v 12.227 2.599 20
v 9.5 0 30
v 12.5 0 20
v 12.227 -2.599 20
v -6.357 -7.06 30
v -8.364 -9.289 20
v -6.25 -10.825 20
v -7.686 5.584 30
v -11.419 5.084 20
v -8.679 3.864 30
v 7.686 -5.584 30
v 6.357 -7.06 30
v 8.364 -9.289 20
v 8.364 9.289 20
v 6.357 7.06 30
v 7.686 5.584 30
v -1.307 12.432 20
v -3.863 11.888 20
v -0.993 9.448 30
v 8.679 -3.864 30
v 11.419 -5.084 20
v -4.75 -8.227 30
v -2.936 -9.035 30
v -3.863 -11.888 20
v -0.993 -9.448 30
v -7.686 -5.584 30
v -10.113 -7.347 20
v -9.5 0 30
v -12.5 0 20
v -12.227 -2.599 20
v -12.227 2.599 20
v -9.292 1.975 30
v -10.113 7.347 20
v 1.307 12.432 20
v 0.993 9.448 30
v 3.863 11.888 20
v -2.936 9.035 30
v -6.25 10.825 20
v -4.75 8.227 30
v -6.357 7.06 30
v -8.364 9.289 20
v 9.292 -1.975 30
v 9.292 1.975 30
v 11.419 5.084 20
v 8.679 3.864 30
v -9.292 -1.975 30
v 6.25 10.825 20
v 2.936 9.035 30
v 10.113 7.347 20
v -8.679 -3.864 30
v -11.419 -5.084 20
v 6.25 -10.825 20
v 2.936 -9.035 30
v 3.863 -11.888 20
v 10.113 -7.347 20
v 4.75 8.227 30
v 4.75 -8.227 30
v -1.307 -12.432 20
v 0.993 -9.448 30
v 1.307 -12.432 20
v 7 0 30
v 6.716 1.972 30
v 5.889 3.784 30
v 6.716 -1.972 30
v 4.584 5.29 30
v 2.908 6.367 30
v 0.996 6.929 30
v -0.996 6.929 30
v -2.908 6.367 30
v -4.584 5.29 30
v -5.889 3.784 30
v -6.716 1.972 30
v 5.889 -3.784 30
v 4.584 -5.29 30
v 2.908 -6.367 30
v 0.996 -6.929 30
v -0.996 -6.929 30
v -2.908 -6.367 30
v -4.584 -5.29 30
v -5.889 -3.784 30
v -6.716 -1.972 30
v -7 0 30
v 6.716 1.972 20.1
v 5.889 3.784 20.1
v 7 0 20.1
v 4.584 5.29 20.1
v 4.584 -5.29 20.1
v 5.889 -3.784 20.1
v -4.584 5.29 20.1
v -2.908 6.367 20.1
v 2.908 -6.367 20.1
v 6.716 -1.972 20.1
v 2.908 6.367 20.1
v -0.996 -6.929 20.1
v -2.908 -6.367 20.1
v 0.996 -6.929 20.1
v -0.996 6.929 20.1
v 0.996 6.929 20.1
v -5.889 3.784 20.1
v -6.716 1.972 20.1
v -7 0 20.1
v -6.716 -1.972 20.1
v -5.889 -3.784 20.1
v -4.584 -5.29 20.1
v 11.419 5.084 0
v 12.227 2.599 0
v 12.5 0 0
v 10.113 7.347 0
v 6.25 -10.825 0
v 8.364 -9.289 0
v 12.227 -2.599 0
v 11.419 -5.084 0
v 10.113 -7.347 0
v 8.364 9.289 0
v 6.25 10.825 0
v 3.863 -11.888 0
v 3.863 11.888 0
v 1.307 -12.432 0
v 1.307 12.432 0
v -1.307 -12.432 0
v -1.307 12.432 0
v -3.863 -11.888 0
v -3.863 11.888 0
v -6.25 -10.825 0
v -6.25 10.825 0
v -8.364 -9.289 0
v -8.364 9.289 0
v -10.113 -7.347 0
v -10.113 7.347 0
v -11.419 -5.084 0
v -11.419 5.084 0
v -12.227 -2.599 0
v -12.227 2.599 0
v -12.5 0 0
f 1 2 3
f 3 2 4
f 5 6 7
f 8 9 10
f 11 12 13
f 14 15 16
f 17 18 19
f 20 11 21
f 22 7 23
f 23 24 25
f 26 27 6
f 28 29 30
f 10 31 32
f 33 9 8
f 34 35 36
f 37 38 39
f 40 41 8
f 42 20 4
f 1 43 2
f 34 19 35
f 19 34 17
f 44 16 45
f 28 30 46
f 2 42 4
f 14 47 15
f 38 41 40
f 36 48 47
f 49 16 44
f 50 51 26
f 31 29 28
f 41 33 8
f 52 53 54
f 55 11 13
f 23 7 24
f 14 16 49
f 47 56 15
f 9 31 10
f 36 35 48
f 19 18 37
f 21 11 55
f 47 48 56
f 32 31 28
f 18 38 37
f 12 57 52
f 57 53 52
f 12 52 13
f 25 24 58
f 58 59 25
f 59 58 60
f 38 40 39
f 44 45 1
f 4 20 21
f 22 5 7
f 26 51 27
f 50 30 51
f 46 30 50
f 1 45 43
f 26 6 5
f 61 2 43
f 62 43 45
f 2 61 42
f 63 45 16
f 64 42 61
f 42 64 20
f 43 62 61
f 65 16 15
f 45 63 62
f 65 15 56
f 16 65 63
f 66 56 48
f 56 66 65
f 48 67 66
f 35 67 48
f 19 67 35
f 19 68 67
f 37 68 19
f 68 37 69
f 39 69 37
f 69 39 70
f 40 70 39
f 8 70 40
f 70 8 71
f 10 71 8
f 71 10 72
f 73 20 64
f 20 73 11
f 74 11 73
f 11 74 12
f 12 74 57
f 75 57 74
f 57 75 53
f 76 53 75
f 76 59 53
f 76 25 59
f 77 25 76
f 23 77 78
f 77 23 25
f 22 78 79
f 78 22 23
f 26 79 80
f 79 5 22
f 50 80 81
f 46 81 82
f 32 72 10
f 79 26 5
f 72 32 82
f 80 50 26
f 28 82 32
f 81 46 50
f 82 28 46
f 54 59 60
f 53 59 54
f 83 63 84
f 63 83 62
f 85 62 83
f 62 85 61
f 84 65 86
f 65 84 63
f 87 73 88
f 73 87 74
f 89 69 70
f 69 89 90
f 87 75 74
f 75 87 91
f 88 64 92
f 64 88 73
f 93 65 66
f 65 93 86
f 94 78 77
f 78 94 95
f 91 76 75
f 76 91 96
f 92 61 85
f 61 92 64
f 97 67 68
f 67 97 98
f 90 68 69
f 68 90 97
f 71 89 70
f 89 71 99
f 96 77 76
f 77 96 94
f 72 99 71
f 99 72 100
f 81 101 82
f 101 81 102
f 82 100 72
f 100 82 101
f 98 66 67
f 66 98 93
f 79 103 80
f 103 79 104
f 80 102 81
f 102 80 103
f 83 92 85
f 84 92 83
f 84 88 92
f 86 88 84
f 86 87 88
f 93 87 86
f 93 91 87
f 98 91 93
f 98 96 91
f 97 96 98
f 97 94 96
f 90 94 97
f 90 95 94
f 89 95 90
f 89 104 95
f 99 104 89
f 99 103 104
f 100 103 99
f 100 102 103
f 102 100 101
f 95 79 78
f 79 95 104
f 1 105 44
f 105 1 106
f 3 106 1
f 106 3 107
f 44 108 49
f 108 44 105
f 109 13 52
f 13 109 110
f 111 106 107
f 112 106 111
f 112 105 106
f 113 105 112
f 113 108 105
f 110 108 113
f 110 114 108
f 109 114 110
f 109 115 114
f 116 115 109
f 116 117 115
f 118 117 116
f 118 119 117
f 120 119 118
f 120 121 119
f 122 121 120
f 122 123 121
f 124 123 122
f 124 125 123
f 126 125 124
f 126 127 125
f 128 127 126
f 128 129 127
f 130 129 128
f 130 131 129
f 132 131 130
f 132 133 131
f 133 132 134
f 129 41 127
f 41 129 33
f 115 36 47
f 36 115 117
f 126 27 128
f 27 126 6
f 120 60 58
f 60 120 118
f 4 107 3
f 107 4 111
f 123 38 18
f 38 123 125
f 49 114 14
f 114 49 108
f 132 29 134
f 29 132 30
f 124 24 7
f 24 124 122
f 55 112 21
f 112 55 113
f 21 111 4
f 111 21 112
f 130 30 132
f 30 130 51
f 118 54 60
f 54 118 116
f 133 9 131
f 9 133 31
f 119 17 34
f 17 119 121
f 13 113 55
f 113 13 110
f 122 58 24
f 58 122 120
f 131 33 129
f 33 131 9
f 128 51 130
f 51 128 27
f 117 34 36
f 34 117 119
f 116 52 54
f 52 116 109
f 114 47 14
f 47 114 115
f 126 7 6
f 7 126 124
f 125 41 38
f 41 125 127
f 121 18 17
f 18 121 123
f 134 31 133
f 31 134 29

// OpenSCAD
cylinder(h=20,d=25);
difference() {
    translate([0,0,20]) cylinder(d1=25,d2=19,h=10);
    translate([0,0,20.1]) cylinder(d=14,h=10);
}
